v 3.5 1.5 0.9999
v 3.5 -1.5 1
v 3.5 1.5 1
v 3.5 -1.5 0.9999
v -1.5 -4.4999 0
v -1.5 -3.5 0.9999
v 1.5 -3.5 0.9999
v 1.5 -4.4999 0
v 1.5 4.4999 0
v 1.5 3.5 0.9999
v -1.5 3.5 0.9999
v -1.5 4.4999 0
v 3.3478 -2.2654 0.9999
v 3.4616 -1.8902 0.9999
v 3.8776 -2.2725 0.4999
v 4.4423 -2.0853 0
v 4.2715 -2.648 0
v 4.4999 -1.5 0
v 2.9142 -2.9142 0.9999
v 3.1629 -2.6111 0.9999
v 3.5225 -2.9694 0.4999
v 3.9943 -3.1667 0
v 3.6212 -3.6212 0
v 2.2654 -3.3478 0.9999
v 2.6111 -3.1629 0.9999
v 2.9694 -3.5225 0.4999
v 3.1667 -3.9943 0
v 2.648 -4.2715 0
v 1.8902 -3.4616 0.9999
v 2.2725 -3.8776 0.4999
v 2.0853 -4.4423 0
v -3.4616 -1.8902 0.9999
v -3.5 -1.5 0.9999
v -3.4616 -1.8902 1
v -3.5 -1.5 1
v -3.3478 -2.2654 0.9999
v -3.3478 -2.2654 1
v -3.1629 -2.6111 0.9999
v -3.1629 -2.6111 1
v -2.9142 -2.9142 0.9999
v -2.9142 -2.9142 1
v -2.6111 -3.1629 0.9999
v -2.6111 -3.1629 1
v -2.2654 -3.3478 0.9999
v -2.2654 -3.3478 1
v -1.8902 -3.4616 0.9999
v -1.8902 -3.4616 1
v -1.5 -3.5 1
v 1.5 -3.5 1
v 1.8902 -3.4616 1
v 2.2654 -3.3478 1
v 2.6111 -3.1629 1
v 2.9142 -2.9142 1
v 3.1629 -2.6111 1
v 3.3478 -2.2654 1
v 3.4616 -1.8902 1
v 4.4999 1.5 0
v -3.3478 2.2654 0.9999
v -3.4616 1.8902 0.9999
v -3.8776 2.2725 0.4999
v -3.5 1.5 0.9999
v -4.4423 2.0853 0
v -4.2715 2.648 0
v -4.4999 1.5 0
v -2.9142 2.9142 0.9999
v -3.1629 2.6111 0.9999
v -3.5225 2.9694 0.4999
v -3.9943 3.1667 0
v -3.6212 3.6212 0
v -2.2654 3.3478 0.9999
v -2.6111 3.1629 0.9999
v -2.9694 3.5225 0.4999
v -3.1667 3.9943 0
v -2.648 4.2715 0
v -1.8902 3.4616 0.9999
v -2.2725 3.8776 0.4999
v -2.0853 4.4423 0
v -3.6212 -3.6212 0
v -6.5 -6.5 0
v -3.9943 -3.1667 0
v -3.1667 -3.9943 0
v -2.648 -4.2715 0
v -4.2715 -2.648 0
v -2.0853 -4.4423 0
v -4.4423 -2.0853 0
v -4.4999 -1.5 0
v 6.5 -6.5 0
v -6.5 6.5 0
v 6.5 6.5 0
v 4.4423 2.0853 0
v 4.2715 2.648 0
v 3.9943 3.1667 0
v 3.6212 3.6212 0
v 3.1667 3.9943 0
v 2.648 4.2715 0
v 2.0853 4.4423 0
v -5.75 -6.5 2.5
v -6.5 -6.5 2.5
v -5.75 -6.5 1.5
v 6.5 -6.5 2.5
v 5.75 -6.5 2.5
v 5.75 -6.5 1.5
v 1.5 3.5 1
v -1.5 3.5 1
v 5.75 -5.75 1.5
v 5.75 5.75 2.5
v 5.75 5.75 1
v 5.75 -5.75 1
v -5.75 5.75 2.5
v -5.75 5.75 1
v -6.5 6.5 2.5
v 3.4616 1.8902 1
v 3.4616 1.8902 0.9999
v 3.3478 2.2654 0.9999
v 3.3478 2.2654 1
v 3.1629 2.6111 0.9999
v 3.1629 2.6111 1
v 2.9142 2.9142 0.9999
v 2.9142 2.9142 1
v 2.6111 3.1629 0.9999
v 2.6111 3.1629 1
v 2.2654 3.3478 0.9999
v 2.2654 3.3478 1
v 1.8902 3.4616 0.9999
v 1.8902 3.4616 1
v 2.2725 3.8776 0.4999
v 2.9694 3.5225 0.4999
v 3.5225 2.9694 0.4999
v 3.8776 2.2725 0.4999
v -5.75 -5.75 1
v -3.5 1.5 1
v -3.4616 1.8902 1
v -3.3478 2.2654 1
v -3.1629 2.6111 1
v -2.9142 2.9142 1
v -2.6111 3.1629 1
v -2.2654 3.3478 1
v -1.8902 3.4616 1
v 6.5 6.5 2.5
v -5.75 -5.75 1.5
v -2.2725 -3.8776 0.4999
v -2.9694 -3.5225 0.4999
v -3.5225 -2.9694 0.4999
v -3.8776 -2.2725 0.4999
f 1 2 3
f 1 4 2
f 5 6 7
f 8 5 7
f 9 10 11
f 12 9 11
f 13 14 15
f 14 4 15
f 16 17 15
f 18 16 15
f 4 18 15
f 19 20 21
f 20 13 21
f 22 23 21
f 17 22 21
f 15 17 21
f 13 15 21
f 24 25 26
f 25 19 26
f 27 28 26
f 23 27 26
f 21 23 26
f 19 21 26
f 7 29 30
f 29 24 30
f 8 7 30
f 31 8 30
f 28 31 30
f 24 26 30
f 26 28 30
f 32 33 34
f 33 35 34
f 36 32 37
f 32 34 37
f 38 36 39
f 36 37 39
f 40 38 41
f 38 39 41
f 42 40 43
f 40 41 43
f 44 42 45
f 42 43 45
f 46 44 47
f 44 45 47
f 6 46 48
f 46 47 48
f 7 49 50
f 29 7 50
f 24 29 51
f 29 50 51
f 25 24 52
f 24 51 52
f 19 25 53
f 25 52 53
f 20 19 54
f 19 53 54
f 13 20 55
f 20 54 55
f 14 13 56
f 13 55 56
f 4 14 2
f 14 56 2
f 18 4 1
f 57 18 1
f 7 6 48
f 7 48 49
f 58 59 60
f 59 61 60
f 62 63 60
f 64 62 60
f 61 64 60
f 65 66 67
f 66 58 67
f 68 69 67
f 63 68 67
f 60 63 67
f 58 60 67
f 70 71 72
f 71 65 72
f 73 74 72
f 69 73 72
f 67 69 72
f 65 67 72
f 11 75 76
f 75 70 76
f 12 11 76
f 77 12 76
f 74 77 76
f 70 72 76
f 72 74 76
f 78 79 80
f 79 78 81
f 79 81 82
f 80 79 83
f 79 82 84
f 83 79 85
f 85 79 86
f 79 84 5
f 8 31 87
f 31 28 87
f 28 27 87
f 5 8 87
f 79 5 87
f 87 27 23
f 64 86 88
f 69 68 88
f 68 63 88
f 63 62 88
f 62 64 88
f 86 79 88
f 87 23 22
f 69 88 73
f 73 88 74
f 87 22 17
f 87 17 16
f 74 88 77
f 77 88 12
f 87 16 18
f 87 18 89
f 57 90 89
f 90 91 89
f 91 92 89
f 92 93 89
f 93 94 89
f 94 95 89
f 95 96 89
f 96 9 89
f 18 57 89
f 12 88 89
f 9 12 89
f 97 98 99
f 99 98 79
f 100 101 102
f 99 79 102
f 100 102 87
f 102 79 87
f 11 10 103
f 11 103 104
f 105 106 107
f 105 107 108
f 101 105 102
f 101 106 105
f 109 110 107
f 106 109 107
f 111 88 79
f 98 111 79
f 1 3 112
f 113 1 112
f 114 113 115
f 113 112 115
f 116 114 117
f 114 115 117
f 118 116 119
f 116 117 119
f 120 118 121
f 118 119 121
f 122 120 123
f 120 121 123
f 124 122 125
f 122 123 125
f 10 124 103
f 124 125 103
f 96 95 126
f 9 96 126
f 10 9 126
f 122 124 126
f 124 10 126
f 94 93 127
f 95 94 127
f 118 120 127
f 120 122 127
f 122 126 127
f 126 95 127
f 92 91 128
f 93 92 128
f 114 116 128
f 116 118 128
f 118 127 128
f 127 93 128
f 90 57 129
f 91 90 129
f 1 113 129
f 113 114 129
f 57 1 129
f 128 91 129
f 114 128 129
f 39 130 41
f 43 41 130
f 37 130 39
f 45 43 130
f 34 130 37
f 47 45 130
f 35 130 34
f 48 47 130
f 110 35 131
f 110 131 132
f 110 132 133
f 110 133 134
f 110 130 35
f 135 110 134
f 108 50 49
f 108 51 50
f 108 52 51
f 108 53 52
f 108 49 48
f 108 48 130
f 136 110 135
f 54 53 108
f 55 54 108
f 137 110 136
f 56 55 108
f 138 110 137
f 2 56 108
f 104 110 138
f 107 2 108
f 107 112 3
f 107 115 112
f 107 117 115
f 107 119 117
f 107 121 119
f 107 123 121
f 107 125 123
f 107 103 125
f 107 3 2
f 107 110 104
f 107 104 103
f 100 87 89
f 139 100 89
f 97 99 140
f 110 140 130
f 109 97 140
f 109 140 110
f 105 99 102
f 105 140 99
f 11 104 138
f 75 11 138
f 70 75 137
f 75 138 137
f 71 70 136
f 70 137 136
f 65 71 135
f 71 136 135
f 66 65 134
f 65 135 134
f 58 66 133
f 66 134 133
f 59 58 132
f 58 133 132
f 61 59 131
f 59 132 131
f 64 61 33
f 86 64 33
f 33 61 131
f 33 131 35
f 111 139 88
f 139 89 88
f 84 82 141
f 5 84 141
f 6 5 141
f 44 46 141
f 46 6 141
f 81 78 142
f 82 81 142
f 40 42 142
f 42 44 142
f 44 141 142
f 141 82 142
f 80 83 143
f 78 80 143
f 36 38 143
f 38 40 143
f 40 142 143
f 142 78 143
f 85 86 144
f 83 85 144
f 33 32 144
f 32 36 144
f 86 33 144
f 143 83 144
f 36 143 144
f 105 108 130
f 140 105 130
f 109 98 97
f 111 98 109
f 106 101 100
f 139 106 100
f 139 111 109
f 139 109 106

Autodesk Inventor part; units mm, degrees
ref_plane "YZ Plane" through (0, 0, 0) normal (1, 0, 0) x (0, 1, 0)
ref_plane "XZ Plane" through (0, 0, 0) normal (0, 1, 0) x (-1, 0, 0)
ref_plane "XY Plane" through (0, 0, 0) normal (0, 0, 1) x (1, 0, 0)
sketch "Sketch2" plane through (0, 0, 0) normal (0, 0, 1) x (1, 0, 0)
  line L0 (-6.5, -6.5) -> (6.5, -6.5)
  line L1 (6.5, -6.5) -> (6.5, 6.5)
  line L2 (6.5, 6.5) -> (-6.5, 6.5)
  line L3 (-6.5, 6.5) -> (-6.5, -6.5)
  line L4 (-6.5, -6.5) -> (6.5, 6.5) construction
  line L5 (6.5, -6.5) -> (-6.5, 6.5) construction
  line L6 (-5.25, -5.25) -> (5.25, -5.25)
  line L7 (5.25, -5.25) -> (5.25, 5.25)
  line L8 (5.25, 5.25) -> (-5.25, 5.25)
  line L9 (-5.25, 5.25) -> (-5.25, -5.25)
  line L10 (-5.25, -5.25) -> (5.25, 5.25) construction
  line L11 (5.25, -5.25) -> (-5.25, 5.25) construction
  line L12 (-5.75, 5.75) -> (5.75, 5.75)
  line L13 (5.75, 5.75) -> (5.75, -5.75)
  line L14 (5.75, -5.75) -> (-5.75, -5.75)
  line L15 (-5.75, -5.75) -> (-5.75, 5.75)
  line L16 (-3.5, -3.5) -> (3.5, -3.5)
  line L17 (3.5, -3.5) -> (3.5, 3.5)
  line L18 (3.5, 3.5) -> (-3.5, 3.5)
  line L19 (-3.5, 3.5) -> (-3.5, -3.5)
  line L20 (-3.5, -3.5) -> (3.5, 3.5) construction
  line L21 (3.5, -3.5) -> (-3.5, 3.5) construction
  point P0 (0, 0)
  dimension "d0" = 13
  dimension "d1" = 13
  dimension "d2" = 10.5
  dimension "d3" = 10.5
  dimension "d4" = 0.5
  dimension "d5" = 7
  dimension "d6" = 7
extrude "Extrusion1" add sketch "Sketch2" along normal blind 2.5 contours L3 L2 L1 L0
extrude "Extrusion2" add sketch "Sketch2" along normal blind 1 contours L9 L8 L7 L6 | L12 L13 L14 L15 | L19 L18 L17 L16
extrude "Extrusion3" cut sketch "Sketch2" along normal blind 1 contours L19 L18 L17 L16
fillet "Fillet1" radius 2 4 edges at (-3.5, 3.5, 0.5) (-3.5, -3.5, 0.5) (3.5, 3.5, 0.5) (3.5, -3.5, 0.5)
chamfer "Chamfer1" distance 1 angle 45 8 edges at (0, 3.5, 0) (-2.9142, 2.9142, 0) (-3.5, 0, 0) (-2.9142, -2.9142, 0) (0, -3.5, 0) (2.9142, -2.9142, 0) (3.5, 0, 0) (2.9142, 2.9142, 0)
sketch "Sketch3" plane through (0, 0, 2.5) normal (0, 0, 1) x (1, 0, 0)
  line L0 (5.75, -5.75) -> (-5.75, -5.75) projected
  line L1 (-6.5, -6.5) -> (6.5, -6.5) projected
  line L2 (-5.75, -5.75) -> (5.75, -5.75)
  line L3 (5.75, -5.75) -> (5.75, -6.5)
  line L4 (5.75, -6.5) -> (-5.75, -6.5)
  line L5 (-5.75, -6.5) -> (-5.75, -5.75)
  point P0 (0, 0)
  dimension "d17" = 11.5
extrude "Extrusion4" cut sketch "Sketch3" against normal blind 1
properties part number "Optical module_lid"
